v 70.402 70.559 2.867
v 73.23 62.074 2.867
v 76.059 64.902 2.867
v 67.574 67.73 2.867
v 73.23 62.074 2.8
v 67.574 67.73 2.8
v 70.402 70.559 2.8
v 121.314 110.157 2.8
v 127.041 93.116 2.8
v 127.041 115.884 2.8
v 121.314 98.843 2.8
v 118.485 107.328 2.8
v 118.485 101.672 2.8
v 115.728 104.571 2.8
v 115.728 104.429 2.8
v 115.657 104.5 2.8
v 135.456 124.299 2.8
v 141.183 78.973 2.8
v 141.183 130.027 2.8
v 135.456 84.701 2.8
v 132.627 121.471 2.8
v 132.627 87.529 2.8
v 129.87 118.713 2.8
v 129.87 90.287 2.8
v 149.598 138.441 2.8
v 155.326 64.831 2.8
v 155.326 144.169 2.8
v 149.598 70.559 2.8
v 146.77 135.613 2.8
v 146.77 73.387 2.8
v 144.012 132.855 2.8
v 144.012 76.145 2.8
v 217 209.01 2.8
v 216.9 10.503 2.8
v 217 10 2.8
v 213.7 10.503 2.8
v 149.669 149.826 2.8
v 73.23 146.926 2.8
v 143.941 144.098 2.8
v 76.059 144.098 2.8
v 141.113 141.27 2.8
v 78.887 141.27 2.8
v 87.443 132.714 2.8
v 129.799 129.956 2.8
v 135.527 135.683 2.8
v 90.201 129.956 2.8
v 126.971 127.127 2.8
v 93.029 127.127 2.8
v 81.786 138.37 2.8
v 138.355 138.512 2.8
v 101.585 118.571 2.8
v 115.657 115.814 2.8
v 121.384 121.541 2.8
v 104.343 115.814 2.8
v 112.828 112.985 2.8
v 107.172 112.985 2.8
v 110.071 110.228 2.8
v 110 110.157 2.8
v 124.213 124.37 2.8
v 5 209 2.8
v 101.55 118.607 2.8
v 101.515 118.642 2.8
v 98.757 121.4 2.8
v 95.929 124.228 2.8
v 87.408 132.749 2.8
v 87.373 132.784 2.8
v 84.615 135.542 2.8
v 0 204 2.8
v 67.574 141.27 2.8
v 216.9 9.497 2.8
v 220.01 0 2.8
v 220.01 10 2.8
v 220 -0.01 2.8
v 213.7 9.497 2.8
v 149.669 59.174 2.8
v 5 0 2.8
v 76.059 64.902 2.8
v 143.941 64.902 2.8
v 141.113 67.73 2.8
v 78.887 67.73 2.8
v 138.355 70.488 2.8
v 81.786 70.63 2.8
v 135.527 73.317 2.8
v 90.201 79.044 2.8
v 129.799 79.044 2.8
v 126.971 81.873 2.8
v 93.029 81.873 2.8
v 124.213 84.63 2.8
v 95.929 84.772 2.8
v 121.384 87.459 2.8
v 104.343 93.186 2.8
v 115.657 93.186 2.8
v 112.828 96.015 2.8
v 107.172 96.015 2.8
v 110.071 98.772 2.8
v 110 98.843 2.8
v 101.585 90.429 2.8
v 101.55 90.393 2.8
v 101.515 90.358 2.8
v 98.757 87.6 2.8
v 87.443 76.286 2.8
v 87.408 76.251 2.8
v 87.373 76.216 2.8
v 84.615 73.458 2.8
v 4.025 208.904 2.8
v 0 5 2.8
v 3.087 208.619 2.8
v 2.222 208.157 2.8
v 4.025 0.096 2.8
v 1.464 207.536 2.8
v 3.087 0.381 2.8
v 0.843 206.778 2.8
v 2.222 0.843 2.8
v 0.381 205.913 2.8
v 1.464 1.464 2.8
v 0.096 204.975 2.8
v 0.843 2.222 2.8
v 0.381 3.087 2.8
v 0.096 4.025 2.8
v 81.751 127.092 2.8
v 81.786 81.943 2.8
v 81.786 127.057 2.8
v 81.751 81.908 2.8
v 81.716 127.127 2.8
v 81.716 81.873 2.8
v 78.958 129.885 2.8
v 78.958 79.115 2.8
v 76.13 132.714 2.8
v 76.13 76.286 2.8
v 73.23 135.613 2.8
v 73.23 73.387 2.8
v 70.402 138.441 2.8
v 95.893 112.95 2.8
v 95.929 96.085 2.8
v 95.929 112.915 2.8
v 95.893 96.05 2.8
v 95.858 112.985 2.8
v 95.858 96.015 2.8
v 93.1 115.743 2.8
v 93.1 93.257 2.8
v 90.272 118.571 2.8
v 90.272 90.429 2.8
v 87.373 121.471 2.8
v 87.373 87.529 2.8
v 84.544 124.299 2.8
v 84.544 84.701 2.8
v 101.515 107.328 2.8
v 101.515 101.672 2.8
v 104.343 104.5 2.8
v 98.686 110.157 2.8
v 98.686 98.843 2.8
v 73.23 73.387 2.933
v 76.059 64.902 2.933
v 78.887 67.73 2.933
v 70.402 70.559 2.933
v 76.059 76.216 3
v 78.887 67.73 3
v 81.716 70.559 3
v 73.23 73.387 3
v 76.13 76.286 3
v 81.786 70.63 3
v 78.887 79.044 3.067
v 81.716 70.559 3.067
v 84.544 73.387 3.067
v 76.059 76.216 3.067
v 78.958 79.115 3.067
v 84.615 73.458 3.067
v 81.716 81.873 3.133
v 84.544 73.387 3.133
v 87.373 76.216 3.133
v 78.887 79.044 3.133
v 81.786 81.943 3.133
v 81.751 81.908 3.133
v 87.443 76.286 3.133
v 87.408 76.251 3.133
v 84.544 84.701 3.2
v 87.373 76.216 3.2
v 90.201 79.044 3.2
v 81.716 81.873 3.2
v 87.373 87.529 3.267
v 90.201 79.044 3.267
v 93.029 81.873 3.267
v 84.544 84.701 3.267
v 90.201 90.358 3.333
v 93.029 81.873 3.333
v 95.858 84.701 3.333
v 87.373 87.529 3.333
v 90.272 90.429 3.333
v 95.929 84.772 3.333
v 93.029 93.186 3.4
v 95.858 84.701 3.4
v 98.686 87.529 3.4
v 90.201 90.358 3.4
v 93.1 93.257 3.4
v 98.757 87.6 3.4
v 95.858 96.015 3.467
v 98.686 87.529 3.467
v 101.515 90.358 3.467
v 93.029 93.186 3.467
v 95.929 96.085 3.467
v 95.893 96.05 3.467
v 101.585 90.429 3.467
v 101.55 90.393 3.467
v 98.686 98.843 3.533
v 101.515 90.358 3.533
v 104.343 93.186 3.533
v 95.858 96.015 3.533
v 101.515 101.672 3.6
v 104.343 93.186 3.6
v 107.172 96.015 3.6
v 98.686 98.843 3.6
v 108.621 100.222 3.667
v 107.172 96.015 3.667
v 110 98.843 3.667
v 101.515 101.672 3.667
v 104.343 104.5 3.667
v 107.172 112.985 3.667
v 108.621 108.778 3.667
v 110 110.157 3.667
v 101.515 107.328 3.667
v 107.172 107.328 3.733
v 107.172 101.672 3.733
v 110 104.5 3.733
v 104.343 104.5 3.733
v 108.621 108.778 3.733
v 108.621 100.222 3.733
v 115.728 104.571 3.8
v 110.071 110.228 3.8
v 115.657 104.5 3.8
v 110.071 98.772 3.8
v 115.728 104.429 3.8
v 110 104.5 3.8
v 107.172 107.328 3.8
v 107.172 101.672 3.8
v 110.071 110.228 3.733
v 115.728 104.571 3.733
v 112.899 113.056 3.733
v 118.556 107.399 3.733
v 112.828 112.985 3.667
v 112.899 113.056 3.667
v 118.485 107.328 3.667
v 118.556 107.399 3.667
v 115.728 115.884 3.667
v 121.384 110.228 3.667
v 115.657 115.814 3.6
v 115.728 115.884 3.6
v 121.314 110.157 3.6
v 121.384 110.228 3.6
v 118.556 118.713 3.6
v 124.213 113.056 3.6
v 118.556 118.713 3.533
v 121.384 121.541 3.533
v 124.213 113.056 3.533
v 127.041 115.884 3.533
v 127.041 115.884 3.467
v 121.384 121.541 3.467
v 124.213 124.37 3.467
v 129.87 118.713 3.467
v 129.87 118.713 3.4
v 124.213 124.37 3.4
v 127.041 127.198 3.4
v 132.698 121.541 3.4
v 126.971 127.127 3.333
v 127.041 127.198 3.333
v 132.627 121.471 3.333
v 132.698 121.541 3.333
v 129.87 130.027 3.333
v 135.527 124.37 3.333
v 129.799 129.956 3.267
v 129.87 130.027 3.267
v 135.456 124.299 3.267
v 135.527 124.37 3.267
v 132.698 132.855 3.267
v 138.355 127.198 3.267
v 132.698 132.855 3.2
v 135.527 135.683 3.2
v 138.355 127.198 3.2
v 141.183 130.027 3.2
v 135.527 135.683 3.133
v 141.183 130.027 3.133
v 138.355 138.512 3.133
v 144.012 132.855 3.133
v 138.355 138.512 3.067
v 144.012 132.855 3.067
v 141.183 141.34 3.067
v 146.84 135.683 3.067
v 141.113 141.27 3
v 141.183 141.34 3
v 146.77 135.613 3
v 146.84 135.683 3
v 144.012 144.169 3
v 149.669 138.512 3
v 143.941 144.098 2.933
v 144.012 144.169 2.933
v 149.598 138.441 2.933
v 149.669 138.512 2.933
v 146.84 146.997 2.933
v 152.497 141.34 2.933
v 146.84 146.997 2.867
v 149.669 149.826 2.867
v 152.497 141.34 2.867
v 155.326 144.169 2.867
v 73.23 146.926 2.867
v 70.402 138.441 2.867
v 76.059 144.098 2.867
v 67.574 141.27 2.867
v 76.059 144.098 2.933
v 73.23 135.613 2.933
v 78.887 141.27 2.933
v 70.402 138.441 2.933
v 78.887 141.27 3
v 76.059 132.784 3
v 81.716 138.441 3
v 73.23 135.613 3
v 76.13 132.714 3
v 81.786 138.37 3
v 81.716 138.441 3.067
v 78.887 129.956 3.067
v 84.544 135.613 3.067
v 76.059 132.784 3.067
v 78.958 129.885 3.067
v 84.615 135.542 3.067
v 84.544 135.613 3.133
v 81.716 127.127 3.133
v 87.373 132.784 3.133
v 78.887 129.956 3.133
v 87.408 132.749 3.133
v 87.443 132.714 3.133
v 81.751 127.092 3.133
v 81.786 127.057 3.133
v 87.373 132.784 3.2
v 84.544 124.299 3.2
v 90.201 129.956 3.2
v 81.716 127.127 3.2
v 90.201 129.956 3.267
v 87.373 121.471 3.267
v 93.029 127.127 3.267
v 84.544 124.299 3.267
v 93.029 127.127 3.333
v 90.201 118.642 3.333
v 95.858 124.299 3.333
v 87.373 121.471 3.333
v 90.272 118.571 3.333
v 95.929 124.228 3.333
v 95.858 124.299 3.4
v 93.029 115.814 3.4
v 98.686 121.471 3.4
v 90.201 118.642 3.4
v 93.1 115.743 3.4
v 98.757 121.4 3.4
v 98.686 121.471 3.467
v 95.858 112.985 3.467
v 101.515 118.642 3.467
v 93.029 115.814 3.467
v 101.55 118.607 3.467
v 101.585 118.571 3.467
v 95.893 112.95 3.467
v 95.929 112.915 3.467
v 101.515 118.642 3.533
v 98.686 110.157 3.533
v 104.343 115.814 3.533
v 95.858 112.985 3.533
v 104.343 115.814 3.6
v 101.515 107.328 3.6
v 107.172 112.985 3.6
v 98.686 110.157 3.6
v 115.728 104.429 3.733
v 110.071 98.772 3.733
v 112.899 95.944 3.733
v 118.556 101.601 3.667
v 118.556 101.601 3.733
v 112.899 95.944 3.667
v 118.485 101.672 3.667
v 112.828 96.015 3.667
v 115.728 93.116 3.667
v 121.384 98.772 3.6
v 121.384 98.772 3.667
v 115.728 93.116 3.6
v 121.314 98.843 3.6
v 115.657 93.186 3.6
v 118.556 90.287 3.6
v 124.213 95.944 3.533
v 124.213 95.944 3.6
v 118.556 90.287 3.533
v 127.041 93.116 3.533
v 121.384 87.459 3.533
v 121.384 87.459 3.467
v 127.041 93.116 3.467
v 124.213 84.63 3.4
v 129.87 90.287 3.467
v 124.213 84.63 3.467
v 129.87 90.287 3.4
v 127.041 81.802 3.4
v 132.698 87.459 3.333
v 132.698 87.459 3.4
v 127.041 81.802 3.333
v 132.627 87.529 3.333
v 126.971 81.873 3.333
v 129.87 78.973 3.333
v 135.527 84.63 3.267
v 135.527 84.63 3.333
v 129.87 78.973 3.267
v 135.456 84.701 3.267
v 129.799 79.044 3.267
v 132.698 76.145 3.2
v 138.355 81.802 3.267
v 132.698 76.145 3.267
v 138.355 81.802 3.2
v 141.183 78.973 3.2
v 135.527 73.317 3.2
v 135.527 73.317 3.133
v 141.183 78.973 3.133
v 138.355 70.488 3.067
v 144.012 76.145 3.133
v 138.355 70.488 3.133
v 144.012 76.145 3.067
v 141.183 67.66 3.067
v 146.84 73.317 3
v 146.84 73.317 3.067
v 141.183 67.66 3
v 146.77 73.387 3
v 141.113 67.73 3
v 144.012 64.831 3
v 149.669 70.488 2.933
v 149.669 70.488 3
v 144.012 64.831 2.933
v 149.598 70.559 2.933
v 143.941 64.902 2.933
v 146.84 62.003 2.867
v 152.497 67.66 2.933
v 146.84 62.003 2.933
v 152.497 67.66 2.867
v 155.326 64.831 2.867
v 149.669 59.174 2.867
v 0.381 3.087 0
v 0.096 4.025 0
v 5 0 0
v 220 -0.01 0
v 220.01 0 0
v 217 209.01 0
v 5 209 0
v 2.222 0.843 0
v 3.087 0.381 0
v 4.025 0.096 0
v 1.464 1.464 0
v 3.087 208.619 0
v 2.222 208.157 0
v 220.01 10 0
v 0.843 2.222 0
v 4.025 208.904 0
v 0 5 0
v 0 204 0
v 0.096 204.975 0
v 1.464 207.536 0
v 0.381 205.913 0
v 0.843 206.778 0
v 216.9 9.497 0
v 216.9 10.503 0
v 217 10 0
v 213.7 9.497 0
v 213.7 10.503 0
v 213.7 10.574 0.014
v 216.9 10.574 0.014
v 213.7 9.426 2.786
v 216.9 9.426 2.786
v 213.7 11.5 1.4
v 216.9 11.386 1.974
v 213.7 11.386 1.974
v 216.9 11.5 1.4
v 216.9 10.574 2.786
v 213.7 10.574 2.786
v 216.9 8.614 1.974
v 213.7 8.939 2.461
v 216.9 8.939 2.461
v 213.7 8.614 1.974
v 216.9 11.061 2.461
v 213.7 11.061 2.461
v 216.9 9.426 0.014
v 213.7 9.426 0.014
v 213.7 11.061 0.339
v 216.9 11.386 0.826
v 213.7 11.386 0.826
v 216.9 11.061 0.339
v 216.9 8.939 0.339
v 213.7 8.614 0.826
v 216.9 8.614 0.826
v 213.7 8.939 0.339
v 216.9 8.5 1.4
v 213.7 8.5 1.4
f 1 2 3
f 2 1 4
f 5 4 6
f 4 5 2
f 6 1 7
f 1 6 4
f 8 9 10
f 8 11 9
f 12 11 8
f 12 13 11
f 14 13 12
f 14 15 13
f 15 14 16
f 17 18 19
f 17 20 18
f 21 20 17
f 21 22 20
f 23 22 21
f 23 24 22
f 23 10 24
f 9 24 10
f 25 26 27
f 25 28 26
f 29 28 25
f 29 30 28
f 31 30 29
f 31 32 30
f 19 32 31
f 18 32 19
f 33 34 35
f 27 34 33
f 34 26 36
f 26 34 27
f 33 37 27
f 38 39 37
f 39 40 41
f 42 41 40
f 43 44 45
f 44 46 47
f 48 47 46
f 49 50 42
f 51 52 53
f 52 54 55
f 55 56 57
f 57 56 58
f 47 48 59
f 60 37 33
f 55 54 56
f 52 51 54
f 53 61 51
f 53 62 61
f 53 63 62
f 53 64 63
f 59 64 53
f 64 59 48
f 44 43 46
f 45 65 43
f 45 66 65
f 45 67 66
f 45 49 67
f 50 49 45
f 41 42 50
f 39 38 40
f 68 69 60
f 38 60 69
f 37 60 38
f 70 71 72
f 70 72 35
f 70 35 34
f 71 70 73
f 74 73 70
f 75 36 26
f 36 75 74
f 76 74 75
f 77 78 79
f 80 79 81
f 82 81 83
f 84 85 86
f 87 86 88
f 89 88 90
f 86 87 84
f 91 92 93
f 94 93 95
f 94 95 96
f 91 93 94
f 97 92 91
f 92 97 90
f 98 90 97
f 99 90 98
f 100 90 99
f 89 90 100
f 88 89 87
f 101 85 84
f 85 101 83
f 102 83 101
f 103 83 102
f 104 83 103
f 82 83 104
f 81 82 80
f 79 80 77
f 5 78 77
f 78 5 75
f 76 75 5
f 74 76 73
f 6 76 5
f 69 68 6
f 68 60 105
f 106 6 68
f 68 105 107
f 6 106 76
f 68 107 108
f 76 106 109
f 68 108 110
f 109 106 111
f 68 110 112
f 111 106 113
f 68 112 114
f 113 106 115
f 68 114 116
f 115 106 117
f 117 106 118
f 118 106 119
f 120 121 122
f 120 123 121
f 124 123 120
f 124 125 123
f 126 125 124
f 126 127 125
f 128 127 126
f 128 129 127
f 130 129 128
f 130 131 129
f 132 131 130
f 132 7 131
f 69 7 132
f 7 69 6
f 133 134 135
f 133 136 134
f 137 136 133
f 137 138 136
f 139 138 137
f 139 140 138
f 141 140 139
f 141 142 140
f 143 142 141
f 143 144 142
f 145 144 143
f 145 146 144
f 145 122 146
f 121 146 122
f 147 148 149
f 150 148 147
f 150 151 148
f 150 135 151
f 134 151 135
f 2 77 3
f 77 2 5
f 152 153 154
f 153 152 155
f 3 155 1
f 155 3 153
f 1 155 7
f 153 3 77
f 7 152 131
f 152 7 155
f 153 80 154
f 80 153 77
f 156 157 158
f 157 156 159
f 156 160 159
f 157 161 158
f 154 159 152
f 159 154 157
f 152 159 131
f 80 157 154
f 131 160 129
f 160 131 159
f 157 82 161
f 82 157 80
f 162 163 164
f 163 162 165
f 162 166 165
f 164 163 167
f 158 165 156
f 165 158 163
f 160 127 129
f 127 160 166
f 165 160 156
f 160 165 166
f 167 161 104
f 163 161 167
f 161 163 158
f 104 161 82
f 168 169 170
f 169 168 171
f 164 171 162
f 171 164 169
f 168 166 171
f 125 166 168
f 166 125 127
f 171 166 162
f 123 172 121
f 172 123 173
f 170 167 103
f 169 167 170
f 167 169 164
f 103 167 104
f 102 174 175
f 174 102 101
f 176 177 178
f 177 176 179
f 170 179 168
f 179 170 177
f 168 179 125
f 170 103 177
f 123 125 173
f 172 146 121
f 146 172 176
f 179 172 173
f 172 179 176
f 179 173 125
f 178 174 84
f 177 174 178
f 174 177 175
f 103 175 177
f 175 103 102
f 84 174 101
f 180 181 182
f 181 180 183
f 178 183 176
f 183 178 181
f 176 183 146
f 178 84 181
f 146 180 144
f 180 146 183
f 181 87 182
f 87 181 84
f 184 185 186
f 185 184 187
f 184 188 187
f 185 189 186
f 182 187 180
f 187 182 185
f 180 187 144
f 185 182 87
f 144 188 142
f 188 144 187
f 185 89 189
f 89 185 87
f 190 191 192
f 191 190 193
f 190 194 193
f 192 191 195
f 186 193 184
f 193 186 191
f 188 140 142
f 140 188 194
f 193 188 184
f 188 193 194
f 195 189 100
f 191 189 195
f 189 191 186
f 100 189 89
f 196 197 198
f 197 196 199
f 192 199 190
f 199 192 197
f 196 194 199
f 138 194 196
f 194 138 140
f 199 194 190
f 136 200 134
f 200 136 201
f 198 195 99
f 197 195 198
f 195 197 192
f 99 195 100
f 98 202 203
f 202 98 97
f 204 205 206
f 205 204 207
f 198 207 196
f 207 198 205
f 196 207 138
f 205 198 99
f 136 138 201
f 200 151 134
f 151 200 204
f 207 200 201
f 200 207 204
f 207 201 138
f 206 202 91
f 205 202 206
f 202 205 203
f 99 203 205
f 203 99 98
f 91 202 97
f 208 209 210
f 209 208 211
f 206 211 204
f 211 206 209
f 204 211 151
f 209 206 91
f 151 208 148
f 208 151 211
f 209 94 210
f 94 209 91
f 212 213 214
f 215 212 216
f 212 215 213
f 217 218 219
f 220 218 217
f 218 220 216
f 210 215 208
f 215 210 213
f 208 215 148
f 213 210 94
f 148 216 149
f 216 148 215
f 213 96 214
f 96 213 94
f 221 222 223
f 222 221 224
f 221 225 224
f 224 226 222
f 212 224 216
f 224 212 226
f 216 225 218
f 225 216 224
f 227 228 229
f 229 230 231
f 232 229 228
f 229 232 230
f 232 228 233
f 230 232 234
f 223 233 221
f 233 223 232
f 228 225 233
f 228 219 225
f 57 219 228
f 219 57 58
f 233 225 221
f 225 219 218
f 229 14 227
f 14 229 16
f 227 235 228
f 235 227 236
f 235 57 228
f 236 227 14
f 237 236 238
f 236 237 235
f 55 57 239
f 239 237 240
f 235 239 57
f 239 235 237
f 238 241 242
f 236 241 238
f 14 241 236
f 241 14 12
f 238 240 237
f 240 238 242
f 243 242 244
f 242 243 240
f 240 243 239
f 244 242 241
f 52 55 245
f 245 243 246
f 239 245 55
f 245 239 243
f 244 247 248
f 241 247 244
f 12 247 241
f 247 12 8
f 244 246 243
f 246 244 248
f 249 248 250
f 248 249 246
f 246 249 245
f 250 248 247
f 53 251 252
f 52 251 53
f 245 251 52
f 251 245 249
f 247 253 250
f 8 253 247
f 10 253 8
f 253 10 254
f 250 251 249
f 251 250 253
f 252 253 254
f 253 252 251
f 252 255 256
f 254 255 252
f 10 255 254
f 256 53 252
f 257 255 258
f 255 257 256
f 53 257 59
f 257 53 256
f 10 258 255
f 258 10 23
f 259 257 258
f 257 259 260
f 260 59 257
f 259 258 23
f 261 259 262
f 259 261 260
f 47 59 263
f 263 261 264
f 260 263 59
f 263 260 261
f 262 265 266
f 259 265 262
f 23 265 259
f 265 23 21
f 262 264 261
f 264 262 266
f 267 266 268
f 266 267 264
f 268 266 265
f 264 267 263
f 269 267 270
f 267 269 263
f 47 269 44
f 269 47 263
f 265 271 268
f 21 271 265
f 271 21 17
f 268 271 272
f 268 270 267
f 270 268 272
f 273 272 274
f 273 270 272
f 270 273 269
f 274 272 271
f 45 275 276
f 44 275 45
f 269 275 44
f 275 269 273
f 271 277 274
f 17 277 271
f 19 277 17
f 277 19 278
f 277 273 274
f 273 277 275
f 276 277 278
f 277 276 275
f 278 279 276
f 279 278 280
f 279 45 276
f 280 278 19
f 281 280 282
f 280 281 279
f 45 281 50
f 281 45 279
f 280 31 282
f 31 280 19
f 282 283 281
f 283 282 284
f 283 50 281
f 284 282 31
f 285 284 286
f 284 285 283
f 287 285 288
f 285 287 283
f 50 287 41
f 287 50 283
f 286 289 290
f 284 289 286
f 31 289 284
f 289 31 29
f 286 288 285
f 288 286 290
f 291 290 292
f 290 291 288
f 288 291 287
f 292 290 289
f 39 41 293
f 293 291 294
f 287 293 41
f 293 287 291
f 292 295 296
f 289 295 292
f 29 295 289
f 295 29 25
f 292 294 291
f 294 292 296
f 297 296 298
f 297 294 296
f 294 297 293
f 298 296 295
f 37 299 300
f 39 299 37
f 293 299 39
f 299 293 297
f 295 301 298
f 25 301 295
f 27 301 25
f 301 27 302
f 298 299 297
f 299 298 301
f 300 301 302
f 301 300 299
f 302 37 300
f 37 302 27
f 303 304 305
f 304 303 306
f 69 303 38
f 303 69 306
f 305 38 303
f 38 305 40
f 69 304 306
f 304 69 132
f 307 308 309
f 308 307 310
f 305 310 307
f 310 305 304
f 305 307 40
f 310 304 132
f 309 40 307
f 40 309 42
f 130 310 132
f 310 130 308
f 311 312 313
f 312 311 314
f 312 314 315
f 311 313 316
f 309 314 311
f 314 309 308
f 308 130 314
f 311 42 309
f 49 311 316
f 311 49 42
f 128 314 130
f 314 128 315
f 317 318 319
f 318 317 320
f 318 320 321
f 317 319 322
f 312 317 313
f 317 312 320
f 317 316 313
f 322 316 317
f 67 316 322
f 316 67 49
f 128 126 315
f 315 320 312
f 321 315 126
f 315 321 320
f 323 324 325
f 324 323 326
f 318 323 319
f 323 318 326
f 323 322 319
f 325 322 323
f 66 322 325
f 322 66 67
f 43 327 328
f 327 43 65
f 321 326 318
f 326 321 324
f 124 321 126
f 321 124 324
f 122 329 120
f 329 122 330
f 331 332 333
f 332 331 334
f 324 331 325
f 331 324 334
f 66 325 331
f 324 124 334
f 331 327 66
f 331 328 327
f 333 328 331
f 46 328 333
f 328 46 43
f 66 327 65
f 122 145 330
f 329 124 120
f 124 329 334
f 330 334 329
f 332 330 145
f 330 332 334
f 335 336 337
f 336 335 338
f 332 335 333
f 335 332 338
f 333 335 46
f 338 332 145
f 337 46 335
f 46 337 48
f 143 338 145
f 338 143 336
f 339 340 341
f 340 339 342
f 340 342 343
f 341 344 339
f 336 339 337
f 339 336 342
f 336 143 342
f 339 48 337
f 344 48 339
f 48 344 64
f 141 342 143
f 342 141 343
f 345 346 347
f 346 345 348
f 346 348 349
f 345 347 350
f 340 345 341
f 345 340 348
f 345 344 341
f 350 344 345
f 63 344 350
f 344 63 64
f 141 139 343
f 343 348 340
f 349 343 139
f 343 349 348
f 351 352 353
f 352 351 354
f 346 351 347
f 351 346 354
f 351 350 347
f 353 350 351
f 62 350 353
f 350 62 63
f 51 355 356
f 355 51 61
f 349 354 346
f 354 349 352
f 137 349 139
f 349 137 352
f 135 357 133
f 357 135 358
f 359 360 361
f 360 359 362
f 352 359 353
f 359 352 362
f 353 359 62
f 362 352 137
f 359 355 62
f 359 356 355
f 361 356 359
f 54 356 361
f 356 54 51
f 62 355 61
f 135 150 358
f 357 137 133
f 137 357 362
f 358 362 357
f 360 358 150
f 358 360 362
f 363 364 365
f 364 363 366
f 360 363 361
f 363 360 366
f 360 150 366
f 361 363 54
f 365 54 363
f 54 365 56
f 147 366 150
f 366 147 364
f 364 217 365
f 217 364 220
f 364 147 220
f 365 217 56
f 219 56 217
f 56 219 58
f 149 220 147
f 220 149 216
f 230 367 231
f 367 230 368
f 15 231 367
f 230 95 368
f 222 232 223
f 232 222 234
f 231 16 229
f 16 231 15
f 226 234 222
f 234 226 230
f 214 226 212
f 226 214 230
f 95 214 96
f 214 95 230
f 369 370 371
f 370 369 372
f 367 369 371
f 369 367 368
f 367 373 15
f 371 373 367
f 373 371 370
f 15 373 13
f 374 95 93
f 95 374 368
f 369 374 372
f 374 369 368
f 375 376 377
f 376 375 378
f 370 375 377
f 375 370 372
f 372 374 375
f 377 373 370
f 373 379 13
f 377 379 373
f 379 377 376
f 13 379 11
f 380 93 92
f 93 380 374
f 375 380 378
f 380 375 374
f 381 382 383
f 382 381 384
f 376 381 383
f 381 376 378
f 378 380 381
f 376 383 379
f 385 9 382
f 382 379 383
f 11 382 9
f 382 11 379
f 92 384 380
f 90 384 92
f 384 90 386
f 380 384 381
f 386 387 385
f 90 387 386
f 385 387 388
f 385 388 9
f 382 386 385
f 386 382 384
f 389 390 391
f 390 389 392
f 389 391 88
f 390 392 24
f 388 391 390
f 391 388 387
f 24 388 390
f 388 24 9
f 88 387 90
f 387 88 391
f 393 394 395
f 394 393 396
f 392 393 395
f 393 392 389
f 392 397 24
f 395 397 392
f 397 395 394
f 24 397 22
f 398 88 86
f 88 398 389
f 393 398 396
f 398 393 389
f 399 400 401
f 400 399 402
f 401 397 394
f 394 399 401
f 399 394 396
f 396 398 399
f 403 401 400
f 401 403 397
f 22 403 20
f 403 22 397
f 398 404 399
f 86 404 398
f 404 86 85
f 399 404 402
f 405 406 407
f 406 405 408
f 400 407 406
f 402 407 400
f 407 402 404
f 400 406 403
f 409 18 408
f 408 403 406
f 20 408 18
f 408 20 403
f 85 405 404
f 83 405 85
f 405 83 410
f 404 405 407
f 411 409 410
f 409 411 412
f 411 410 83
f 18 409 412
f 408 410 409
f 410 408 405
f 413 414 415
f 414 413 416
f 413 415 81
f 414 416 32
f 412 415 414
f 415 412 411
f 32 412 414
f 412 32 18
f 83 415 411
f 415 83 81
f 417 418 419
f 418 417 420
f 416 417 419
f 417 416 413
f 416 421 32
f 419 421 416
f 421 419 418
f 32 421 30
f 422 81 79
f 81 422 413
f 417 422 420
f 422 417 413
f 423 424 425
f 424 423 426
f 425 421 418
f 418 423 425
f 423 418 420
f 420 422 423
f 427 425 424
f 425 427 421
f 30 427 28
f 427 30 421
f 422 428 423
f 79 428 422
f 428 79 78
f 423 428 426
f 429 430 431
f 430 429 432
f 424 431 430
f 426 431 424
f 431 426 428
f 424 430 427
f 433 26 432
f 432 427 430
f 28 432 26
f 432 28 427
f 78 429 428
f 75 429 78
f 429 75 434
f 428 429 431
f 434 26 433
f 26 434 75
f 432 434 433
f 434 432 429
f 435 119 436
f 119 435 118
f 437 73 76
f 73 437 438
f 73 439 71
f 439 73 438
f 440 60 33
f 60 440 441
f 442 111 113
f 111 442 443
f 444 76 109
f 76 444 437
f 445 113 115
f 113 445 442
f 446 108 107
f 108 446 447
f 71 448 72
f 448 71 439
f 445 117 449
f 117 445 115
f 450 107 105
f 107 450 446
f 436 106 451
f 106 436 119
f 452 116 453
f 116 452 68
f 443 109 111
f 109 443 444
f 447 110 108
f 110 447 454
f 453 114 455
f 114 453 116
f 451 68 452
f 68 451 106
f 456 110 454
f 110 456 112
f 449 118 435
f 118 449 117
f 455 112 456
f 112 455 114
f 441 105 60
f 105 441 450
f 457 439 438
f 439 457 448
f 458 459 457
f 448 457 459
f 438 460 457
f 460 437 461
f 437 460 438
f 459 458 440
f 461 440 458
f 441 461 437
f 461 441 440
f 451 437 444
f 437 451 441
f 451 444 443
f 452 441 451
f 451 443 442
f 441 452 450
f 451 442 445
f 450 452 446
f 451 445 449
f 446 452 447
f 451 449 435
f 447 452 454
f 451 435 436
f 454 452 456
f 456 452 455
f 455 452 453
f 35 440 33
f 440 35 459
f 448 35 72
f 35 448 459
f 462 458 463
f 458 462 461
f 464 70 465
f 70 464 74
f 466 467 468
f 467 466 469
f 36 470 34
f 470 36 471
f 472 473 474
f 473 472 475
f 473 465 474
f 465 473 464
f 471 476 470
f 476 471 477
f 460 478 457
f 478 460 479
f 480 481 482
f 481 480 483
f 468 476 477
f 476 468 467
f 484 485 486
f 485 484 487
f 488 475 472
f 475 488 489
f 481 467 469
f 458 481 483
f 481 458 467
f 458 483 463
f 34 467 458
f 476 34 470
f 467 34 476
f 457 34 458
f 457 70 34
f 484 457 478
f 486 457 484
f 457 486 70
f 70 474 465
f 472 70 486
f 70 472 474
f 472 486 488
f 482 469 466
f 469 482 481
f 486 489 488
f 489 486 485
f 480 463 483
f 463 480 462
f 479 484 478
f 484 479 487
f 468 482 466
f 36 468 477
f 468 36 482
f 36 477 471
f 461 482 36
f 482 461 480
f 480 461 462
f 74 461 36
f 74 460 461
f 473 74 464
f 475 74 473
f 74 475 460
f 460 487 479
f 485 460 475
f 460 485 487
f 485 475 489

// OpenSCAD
// A部分：220mm × 209mm × 2.8mm
// 滑槽式拼接 - 滑槽
// 从上往下滑入固定

// 参数
width = 220;     // 宽度 (mm)
height = 209;    // 高度 (mm)
thickness = 2.8; // 厚度 (mm)
corner_radius = 5;  // 倒角半径 (mm)

// 滑槽参数
slot_depth = 3;       // 槽深度 (mm)
slot_height = 3;      // 槽高度 (mm)
slot_length = 200;    // 槽长度 (mm)
slot_offset = 10;      // 槽距离边缘 (mm)

// 定位销参数
pin_radius = 1.5;
pin_depth = 3;

// X 图案参数
x_max_height = 1.0;
x_width = 8;
x_diagonal = 120;

// 圆角矩形模块（右侧不倒角）
module rounded_rect_right_flat(w, h, r, t) {
    hull() {
        translate([r, r, 0]) cylinder(h = t, r = r, $fn = 32);
        translate([r, h - r, 0]) cylinder(h = t, r = r, $fn = 32);
        translate([w, h, 0]) cylinder(h = t, r = 0.01, $fn = 4);
        translate([w, 0, 0]) cylinder(h = t, r = 0.01, $fn = 4);
    }
}

// 创建主体
difference() {
    union() {
        // 面板主体
        color("LightGray") {
            rounded_rect_right_flat(width, height, corner_radius, thickness);
        }

        // X 图案
        color("DarkGray") {
            translate([width/2, height/2, 0])
            x_pattern();
        }
    }

    // 滑槽（在右侧，从上往下）
    color("Red") {
        // 主滑槽
        translate([width - slot_depth, slot_offset, -0.1])
        cube([slot_depth + 0.2, slot_length, slot_height + 0.2]);

        // 顶部定位孔（防止滑出）
        translate([width - slot_depth - 0.1, slot_offset, thickness/2])
        rotate([0, -90, 0])
        cylinder(h = slot_depth + 0.2, r = pin_radius, $fn = 16);
    }
}

// X 图案模块
module x_pattern() {
    segments = 30;
    segment_length = x_diagonal / segments;

    union() {
        for (i = [-segments/2:segments/2-1]) {
            dist_ratio = abs(i) / (segments/2);
            current_height = x_max_height * (1 - dist_ratio);

            translate([0, 0, thickness])
            rotate([0, 0, 45])
            translate([i * segment_length, -x_width/2, 0])
            cube([segment_length + 0.1, x_width, current_height]);
        }

        for (i = [-segments/2:segments/2-1]) {
            dist_ratio = abs(i) / (segments/2);
            current_height = x_max_height * (1 - dist_ratio);

            translate([0, 0, thickness])
            rotate([0, 0, -45])
            translate([i * segment_length, -x_width/2, 0])
            cube([segment_length + 0.1, x_width, current_height]);
        }
    }
}
